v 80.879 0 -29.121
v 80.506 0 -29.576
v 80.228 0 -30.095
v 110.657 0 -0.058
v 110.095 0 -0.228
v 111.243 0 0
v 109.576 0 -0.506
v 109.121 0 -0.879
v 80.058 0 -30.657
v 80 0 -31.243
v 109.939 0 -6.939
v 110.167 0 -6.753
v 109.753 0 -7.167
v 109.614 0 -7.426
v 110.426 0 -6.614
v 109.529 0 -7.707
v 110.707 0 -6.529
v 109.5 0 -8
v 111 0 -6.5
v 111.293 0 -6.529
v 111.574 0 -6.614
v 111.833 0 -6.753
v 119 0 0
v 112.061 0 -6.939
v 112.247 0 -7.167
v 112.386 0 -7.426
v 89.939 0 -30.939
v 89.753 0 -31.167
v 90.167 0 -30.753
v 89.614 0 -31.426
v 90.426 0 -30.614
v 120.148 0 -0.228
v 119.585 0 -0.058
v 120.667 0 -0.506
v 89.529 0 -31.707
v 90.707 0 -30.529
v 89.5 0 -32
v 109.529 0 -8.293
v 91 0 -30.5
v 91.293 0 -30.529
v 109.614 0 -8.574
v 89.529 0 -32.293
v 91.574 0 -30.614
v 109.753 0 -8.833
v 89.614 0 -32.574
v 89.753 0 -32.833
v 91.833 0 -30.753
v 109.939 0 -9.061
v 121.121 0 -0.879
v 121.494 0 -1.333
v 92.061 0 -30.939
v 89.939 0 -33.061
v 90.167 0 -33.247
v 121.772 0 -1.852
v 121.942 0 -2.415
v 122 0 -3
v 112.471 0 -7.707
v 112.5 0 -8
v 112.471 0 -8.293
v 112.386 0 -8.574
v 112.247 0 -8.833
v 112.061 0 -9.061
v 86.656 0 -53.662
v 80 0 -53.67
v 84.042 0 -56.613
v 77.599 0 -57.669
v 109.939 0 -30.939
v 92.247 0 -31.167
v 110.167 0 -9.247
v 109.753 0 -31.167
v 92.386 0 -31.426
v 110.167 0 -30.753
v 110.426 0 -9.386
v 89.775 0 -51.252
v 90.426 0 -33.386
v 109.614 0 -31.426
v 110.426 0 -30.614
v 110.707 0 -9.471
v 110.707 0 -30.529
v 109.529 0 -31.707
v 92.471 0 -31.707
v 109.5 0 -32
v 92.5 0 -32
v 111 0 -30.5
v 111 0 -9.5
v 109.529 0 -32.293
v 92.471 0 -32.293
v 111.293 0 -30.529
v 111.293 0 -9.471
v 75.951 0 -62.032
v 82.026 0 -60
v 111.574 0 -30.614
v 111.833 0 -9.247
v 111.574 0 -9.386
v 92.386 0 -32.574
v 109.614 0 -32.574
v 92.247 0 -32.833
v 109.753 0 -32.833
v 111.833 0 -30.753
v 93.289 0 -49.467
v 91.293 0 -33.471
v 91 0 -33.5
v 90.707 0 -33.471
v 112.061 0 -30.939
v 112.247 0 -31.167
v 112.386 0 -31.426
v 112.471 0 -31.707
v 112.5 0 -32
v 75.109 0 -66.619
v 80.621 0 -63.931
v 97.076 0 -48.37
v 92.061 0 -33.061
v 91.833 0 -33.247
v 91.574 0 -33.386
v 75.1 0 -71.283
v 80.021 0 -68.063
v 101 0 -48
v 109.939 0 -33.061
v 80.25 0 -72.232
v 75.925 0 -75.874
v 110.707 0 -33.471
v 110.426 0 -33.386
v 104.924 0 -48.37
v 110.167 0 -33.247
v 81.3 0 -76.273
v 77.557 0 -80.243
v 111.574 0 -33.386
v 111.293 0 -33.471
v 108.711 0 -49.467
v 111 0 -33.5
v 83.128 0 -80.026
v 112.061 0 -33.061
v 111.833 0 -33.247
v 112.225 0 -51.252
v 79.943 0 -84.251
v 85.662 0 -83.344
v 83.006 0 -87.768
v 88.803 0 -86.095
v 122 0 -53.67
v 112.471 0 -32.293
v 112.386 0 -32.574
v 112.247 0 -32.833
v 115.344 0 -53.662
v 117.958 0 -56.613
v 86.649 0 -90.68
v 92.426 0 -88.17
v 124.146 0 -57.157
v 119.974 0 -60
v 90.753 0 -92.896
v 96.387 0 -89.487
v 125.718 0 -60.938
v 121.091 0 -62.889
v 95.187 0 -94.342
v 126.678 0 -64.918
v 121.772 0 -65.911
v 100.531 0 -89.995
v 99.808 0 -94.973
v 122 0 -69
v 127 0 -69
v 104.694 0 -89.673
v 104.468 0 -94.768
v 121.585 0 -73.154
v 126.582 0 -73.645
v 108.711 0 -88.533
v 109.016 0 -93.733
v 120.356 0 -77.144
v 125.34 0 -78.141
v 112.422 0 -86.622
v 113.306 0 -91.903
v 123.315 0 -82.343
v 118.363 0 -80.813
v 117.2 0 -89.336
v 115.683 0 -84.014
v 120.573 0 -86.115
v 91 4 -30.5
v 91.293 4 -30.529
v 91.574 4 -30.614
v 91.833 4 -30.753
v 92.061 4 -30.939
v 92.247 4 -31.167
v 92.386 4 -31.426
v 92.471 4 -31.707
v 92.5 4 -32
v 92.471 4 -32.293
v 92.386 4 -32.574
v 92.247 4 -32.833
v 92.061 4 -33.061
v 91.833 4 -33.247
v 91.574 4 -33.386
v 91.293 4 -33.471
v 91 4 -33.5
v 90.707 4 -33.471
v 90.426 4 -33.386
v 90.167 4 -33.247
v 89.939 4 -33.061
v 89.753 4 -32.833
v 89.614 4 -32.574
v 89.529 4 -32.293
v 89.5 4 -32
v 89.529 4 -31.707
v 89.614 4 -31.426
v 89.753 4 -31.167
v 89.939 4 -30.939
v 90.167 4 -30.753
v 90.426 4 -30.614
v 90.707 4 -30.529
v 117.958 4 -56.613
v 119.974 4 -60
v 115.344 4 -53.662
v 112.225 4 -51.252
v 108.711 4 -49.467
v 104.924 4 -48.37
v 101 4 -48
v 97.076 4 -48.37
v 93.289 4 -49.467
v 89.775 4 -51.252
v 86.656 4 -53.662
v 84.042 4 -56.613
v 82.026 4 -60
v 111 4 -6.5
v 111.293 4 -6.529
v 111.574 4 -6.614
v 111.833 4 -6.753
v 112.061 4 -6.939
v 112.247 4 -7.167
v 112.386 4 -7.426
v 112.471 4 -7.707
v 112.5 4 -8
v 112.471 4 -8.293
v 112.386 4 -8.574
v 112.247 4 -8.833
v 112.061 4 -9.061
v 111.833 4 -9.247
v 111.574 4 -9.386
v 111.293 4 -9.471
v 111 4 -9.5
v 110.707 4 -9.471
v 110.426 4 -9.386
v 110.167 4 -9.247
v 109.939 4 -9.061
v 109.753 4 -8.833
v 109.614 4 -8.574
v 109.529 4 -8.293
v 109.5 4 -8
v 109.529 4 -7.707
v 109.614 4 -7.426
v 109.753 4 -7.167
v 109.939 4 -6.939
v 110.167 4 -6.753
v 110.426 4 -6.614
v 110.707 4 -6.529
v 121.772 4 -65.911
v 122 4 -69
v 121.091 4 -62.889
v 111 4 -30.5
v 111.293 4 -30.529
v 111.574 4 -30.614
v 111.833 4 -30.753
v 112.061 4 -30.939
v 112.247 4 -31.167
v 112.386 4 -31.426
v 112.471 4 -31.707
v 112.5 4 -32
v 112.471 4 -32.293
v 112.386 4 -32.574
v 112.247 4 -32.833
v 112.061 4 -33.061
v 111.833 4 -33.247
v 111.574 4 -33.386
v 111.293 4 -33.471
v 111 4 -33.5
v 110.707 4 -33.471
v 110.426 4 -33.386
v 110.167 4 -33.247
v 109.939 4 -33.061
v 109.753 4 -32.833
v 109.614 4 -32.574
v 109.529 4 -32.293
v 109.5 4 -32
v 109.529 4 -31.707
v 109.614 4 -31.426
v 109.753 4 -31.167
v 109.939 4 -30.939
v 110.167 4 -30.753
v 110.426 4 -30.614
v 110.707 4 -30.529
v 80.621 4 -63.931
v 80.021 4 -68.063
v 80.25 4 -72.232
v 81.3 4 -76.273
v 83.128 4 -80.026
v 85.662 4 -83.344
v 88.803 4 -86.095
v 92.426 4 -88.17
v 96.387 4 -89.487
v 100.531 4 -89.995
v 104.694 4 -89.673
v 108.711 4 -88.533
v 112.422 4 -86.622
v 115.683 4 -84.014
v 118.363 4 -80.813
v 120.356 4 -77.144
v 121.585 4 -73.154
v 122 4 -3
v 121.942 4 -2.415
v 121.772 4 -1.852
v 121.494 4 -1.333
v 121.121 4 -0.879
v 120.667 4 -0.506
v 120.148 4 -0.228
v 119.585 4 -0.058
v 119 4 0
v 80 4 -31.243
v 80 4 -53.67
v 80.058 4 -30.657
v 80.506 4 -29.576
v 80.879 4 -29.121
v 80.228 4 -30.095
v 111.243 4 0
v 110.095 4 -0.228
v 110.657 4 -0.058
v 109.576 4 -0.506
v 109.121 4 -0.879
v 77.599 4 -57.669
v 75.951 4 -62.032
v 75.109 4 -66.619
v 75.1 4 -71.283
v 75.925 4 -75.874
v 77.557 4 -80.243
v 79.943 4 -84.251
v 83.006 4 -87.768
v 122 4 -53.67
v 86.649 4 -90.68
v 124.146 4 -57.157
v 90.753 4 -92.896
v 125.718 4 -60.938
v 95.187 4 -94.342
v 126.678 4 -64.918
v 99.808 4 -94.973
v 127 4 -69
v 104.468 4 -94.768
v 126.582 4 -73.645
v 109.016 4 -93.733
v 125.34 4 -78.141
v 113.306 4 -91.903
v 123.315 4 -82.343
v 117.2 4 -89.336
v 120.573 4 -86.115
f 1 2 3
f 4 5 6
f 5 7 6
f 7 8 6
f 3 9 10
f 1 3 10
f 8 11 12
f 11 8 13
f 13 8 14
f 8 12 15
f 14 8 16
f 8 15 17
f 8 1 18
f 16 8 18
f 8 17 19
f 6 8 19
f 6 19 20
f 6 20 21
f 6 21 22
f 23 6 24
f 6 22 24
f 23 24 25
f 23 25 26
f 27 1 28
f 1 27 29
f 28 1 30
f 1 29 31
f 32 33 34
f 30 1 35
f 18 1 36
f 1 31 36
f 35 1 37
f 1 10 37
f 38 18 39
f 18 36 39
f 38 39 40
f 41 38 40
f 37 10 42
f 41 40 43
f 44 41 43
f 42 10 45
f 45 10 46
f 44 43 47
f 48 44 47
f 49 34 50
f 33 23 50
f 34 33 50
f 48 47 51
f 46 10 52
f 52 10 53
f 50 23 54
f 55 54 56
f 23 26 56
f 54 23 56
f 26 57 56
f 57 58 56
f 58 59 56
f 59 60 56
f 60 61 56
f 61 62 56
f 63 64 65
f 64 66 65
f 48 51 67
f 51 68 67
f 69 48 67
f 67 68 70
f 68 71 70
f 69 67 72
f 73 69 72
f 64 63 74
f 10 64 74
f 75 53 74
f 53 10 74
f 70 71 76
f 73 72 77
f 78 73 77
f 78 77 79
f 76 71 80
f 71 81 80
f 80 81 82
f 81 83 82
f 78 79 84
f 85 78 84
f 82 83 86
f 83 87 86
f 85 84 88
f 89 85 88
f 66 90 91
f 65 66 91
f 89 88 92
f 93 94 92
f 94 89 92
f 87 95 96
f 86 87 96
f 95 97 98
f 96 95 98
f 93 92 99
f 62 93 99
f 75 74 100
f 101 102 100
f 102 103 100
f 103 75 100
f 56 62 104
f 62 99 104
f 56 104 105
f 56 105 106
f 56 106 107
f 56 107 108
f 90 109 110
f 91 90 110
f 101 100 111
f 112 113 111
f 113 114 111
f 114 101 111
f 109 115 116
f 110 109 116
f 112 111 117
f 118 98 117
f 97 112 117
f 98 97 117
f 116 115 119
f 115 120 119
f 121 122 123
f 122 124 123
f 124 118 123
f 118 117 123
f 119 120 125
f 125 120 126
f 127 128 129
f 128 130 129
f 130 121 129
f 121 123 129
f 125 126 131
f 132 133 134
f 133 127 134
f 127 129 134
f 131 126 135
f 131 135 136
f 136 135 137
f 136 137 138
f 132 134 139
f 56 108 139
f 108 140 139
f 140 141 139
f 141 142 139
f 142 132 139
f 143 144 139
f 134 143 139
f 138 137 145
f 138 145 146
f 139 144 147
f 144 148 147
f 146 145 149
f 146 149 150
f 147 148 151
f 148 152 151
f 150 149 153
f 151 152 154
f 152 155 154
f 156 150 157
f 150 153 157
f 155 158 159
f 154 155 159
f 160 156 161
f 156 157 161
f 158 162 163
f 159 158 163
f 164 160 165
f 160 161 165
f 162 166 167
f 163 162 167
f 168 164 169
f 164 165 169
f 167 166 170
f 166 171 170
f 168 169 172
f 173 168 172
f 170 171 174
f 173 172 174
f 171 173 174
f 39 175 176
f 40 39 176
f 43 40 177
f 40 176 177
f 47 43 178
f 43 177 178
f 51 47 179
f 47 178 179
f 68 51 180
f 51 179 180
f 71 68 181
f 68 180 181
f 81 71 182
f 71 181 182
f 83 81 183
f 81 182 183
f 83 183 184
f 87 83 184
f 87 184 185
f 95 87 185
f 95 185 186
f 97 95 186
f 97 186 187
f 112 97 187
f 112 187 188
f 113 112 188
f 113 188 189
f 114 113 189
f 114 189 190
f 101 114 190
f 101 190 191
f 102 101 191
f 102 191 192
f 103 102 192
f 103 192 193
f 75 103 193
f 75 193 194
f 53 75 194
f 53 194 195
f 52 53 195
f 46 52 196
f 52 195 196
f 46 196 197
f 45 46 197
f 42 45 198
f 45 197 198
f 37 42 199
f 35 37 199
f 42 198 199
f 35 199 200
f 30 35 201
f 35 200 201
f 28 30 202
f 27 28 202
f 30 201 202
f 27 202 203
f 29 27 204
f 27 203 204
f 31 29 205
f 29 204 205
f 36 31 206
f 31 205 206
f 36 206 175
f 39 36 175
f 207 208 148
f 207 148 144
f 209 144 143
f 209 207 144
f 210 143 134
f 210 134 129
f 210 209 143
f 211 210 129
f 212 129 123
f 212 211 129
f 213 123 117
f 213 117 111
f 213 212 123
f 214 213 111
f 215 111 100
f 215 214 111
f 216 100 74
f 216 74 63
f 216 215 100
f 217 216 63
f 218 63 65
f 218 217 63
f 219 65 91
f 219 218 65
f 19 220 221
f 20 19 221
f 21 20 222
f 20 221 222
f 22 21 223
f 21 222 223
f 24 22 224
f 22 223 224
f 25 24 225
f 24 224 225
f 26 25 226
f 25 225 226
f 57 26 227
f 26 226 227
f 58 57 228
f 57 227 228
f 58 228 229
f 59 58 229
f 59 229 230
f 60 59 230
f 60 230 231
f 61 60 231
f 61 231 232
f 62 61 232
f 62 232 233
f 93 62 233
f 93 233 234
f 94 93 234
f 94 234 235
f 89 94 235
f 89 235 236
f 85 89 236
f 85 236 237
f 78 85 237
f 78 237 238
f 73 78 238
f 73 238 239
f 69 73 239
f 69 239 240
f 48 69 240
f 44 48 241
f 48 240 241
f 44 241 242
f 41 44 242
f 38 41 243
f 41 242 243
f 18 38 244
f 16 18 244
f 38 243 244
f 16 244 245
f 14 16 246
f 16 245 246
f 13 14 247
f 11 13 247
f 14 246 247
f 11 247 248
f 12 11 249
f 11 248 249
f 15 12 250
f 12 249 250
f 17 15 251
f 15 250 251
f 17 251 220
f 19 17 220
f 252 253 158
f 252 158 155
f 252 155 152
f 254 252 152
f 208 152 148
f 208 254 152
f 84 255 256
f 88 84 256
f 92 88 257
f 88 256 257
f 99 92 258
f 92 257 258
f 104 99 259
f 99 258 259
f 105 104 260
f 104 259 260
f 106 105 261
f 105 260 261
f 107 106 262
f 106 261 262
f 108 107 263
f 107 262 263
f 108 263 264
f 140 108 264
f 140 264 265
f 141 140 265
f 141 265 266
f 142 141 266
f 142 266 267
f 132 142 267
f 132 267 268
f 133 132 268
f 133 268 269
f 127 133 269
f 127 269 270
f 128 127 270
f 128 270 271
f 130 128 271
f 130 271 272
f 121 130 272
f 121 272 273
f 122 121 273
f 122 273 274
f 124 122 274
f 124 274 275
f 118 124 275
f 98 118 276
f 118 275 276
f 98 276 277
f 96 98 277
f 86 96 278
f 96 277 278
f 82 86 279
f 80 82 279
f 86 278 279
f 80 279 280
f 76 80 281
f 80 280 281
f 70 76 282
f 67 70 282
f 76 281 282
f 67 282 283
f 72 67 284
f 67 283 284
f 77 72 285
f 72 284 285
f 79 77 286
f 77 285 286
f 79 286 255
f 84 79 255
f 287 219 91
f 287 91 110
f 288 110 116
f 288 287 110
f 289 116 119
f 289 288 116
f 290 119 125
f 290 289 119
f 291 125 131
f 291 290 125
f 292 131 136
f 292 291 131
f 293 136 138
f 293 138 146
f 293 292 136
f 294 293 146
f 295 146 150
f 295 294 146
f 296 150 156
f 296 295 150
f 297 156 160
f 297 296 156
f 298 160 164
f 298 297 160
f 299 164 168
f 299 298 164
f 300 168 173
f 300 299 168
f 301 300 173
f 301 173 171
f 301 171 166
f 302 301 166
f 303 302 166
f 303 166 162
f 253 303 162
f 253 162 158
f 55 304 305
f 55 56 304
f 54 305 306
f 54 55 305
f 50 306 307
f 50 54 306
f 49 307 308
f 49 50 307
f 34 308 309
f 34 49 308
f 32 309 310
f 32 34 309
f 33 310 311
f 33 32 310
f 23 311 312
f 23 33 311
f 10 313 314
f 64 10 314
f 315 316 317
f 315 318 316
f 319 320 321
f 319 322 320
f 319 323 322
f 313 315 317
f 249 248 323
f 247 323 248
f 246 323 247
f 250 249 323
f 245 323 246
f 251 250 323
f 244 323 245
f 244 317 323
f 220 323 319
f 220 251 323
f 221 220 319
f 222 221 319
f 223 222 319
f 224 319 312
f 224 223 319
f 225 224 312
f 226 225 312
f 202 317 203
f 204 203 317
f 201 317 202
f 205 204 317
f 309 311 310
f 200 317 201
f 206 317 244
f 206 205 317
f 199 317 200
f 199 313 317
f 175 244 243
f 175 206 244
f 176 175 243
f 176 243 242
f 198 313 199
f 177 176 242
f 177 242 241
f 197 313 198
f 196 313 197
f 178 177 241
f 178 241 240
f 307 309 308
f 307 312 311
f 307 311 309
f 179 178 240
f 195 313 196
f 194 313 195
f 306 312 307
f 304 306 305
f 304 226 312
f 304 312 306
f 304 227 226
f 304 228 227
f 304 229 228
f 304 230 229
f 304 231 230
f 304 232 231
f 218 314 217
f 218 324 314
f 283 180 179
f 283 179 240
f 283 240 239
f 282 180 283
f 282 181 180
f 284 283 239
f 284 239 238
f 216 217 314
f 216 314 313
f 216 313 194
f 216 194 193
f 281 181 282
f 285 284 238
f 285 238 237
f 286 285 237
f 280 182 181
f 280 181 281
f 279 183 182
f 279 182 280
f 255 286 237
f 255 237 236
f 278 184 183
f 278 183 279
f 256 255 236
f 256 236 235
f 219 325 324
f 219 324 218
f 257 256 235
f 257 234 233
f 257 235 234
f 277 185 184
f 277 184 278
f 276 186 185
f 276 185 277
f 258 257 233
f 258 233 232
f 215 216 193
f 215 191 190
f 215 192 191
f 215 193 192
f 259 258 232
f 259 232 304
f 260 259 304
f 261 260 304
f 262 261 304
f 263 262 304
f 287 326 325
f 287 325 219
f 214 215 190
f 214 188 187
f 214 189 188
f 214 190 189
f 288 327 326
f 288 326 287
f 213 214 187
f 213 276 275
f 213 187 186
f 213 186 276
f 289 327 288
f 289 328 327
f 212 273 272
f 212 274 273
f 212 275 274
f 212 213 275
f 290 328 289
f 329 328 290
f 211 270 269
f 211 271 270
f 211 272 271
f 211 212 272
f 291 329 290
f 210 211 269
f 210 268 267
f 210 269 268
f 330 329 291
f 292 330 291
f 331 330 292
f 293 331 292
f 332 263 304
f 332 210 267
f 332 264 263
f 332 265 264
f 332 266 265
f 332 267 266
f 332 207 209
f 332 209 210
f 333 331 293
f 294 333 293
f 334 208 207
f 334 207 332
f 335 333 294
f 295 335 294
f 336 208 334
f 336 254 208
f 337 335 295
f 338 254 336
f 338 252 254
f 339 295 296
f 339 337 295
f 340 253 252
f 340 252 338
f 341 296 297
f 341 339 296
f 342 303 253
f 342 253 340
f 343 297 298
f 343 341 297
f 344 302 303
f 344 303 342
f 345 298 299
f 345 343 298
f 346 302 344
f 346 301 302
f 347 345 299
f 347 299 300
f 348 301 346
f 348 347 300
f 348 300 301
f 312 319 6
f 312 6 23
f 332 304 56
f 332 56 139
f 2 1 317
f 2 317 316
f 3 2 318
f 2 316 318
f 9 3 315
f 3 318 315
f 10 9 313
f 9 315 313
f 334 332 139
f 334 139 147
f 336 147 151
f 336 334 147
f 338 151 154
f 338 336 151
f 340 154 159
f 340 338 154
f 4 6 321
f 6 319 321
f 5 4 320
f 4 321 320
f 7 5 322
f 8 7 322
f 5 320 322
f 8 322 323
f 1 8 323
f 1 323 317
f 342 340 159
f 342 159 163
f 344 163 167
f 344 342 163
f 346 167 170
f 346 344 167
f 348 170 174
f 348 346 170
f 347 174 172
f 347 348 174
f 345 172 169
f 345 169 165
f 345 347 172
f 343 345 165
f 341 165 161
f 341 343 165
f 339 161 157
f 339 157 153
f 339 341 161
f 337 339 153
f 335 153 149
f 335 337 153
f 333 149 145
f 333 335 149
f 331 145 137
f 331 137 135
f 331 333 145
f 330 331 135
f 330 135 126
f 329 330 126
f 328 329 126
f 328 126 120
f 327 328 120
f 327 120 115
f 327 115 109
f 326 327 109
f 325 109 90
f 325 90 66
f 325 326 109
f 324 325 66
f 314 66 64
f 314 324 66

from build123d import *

# Parameters (mm, degrees)
SKETCH_2_R             = 1.5
SKETCH_2_R_2           = 9.5
EXTRUDE_1_DEPTH        = 4
CUT_EXTRUDE_1_DEPTH    = 124.429075185
EXTRUDE_2_DEPTH        = 4
SKETCH_7_R             = 1.5
CUT_EXTRUDE_2_DEPTH    = 155.008884812
FILLET_1_R             = 3
SKETCH_6_4_OUTSIDE_W   = 131.04
SKETCH_6_4_OUTSIDE_H   = 122.515
SKETCH_6_4_OUTSIDE_R   = 21
SKETCH_6_4_OUTSIDE_W_2 = 42
SKETCH_6_4_OUTSIDE_H_2 = 60
CUT_EXTRUDE_4_DEPTH    = 154.441846019
EXTRUDE_3_DEPTH        = 4
CUT_EXTRUDE_5_DEPTH    = 159.650559407
FILLET_2_R             = 3


with BuildPart() as part:
    # 草图2 → 凸台-拉伸1 (new body)
    with BuildSketch(Plane(origin=(0, 0, 0), x_dir=(1, 0, 0), z_dir=(0, 1, 0))):
        Polygon((0, 0), (0, 60), (40, 93.908128514), (80, 60), (80, 0), (68, 0), (68, 42), (40, 54), (12, 42), (12, 0), align=None)
        with Locations(Location((6, 32, 0), (0, 0, 270))):
            Circle(SKETCH_2_R, mode=Mode.SUBTRACT)
        with Locations(Location((6, 8, 0), (0, 0, 270))):
            Circle(SKETCH_2_R, mode=Mode.SUBTRACT)
        with Locations(Location((40, 69, 0), (0, 0, 270))):
            Circle(SKETCH_2_R_2, mode=Mode.SUBTRACT)
        with Locations(Location((74, 8, 0), (0, 0, 90))):
            Circle(SKETCH_2_R, mode=Mode.SUBTRACT)
        with Locations(Location((74, 32, 0), (0, 0, 90))):
            Circle(SKETCH_2_R, mode=Mode.SUBTRACT)
    extrude(amount=EXTRUDE_1_DEPTH)

    # 草图4 → 切除-拉伸1 (cut, through all)
    with BuildSketch(Plane(origin=(0, 4, 0), x_dir=(1, 0, 0), z_dir=(0, 1, 0))):
        with BuildLine():
            Line((24.36723091, 80.656179931), (0, 60))
            Line((0, 60), (0, 0))
            Line((0, 0), (12, 0))
            Line((12, 0), (12, 42))
            Line((12, 42), (32.756034747, 50.895443463))
            ThreePointArc((32.756034747, 50.895443463), (21.23136653, 63.709593809), (24.36723091, 80.656179931))
        make_face()
    extrude(amount=-CUT_EXTRUDE_1_DEPTH, mode=Mode.SUBTRACT)

    # 草图6 → 凸台-拉伸2 (add)
    with BuildSketch(Plane(origin=(0, 4, 0), x_dir=(1, 0, 0), z_dir=(0, 1, 0))):
        with BuildLine():
            Line((82.026334039, 60), (80, 60))
            Line((80, 60), (80, 0))
            Line((80, 0), (122, 0))
            Line((122, 0), (122, 60))
            Line((122, 60), (119.973665961, 60))
            ThreePointArc((119.973665961, 60), (101, 48), (82.026334039, 60))
        make_face()
    extrude(amount=-EXTRUDE_2_DEPTH)

    # 草图7 → 切除-拉伸2 (cut, through all)
    with BuildSketch(Plane(origin=(0, 4, 0), x_dir=(1, 0, 0), z_dir=(0, 1, 0))):
        with Locations(Location((91, 32, 0), (0, 0, 270))):
            Circle(SKETCH_7_R)
        with Locations(Location((74, 32, 0), (0, 0, 90))):
            Circle(SKETCH_7_R)
        with Locations(Location((74, 8, 0), (0, 0, 90))):
            Circle(SKETCH_7_R)
        with Locations(Location((111, 32, 0), (0, 0, 270))):
            Circle(SKETCH_7_R)
        with Locations(Location((111, 8, 0), (0, 0, 270))):
            Circle(SKETCH_7_R)
        with Locations(Location((91, 8, 0), (0, 0, 270))):
            Circle(SKETCH_7_R)
    extrude(amount=-CUT_EXTRUDE_2_DEPTH, mode=Mode.SUBTRACT)

    # 圆角1
    fillet_1_edges = [part.edges().sort_by_distance(p)[0] for p in [
        (40, 2, -93.908128514),
        (80, 2, -60),
        (68, 2, 0),
        (68, 2, -42),
        (40, 2, -54),
        (24.36723091, 2, -80.656179931),
        (32.756034747, 2, -50.895443463),
        (122, 2, 0),
    ]]
    fillet(fillet_1_edges, radius=FILLET_1_R)

    # 草图6<4> outside → 切除-拉伸4 (cut, through all)
    with BuildSketch(Plane(origin=(0, 4, 0), x_dir=(1, 0, 0), z_dir=(0, 1, 0))):
        with Locations((71.25, 46.4875)):
            Rectangle(SKETCH_6_4_OUTSIDE_W, SKETCH_6_4_OUTSIDE_H)
        with Locations((101, 69)):
            Circle(SKETCH_6_4_OUTSIDE_R, mode=Mode.SUBTRACT)
        with Locations((101, 30)):
            Rectangle(SKETCH_6_4_OUTSIDE_W_2, SKETCH_6_4_OUTSIDE_H_2, mode=Mode.SUBTRACT)
    extrude(amount=-CUT_EXTRUDE_4_DEPTH, mode=Mode.SUBTRACT)

    # 草图8 → 凸台-拉伸3 (add)
    with BuildSketch(Plane(origin=(0, 4, 0), x_dir=(1, 0, 0), z_dir=(0, 1, 0))):
        with BuildLine():
            ThreePointArc((119.973665961, 60), (101, 48), (82.026334039, 60))
            Line((82.026334039, 60), (80, 60))
            Line((80, 60), (80, 53.670290283))
            ThreePointArc((80, 53.670290283), (101, 43), (122, 53.670290283))
            Line((122, 53.670290283), (122, 60))
            Line((122, 60), (119.973665961, 60))
        make_face()
        with BuildLine():
            Line((80, 60), (82.026334039, 60))
            ThreePointArc((82.026334039, 60), (96.387353535, 89.487154331), (122, 69))
            ThreePointArc((122, 69), (121.487154331, 64.387353535), (119.973665961, 60))
            Line((119.973665961, 60), (122, 60))
            Line((122, 60), (122, 53.670290283))
            ThreePointArc((122, 53.670290283), (125.718414189, 60.937742252), (127, 69))
            ThreePointArc((127, 69), (92.937742252, 93.718414189), (80, 53.670290283))
            Line((80, 53.670290283), (80, 60))
        make_face()
    extrude(amount=-EXTRUDE_3_DEPTH)

    # 草图9 → 切除-拉伸5 (cut, through all)
    with BuildSketch(Plane.XZ):
        Polygon((110, 0), (80, -30), (80, 0), align=None)
    extrude(amount=-CUT_EXTRUDE_5_DEPTH, mode=Mode.SUBTRACT)

    # 圆角2
    fillet_2_edges = [part.edges().sort_by_distance(p)[0] for p in [
        (110, 2, 0),
        (80, 2, -30),
    ]]
    fillet(fillet_2_edges, radius=FILLET_2_R)


solid = part.part
